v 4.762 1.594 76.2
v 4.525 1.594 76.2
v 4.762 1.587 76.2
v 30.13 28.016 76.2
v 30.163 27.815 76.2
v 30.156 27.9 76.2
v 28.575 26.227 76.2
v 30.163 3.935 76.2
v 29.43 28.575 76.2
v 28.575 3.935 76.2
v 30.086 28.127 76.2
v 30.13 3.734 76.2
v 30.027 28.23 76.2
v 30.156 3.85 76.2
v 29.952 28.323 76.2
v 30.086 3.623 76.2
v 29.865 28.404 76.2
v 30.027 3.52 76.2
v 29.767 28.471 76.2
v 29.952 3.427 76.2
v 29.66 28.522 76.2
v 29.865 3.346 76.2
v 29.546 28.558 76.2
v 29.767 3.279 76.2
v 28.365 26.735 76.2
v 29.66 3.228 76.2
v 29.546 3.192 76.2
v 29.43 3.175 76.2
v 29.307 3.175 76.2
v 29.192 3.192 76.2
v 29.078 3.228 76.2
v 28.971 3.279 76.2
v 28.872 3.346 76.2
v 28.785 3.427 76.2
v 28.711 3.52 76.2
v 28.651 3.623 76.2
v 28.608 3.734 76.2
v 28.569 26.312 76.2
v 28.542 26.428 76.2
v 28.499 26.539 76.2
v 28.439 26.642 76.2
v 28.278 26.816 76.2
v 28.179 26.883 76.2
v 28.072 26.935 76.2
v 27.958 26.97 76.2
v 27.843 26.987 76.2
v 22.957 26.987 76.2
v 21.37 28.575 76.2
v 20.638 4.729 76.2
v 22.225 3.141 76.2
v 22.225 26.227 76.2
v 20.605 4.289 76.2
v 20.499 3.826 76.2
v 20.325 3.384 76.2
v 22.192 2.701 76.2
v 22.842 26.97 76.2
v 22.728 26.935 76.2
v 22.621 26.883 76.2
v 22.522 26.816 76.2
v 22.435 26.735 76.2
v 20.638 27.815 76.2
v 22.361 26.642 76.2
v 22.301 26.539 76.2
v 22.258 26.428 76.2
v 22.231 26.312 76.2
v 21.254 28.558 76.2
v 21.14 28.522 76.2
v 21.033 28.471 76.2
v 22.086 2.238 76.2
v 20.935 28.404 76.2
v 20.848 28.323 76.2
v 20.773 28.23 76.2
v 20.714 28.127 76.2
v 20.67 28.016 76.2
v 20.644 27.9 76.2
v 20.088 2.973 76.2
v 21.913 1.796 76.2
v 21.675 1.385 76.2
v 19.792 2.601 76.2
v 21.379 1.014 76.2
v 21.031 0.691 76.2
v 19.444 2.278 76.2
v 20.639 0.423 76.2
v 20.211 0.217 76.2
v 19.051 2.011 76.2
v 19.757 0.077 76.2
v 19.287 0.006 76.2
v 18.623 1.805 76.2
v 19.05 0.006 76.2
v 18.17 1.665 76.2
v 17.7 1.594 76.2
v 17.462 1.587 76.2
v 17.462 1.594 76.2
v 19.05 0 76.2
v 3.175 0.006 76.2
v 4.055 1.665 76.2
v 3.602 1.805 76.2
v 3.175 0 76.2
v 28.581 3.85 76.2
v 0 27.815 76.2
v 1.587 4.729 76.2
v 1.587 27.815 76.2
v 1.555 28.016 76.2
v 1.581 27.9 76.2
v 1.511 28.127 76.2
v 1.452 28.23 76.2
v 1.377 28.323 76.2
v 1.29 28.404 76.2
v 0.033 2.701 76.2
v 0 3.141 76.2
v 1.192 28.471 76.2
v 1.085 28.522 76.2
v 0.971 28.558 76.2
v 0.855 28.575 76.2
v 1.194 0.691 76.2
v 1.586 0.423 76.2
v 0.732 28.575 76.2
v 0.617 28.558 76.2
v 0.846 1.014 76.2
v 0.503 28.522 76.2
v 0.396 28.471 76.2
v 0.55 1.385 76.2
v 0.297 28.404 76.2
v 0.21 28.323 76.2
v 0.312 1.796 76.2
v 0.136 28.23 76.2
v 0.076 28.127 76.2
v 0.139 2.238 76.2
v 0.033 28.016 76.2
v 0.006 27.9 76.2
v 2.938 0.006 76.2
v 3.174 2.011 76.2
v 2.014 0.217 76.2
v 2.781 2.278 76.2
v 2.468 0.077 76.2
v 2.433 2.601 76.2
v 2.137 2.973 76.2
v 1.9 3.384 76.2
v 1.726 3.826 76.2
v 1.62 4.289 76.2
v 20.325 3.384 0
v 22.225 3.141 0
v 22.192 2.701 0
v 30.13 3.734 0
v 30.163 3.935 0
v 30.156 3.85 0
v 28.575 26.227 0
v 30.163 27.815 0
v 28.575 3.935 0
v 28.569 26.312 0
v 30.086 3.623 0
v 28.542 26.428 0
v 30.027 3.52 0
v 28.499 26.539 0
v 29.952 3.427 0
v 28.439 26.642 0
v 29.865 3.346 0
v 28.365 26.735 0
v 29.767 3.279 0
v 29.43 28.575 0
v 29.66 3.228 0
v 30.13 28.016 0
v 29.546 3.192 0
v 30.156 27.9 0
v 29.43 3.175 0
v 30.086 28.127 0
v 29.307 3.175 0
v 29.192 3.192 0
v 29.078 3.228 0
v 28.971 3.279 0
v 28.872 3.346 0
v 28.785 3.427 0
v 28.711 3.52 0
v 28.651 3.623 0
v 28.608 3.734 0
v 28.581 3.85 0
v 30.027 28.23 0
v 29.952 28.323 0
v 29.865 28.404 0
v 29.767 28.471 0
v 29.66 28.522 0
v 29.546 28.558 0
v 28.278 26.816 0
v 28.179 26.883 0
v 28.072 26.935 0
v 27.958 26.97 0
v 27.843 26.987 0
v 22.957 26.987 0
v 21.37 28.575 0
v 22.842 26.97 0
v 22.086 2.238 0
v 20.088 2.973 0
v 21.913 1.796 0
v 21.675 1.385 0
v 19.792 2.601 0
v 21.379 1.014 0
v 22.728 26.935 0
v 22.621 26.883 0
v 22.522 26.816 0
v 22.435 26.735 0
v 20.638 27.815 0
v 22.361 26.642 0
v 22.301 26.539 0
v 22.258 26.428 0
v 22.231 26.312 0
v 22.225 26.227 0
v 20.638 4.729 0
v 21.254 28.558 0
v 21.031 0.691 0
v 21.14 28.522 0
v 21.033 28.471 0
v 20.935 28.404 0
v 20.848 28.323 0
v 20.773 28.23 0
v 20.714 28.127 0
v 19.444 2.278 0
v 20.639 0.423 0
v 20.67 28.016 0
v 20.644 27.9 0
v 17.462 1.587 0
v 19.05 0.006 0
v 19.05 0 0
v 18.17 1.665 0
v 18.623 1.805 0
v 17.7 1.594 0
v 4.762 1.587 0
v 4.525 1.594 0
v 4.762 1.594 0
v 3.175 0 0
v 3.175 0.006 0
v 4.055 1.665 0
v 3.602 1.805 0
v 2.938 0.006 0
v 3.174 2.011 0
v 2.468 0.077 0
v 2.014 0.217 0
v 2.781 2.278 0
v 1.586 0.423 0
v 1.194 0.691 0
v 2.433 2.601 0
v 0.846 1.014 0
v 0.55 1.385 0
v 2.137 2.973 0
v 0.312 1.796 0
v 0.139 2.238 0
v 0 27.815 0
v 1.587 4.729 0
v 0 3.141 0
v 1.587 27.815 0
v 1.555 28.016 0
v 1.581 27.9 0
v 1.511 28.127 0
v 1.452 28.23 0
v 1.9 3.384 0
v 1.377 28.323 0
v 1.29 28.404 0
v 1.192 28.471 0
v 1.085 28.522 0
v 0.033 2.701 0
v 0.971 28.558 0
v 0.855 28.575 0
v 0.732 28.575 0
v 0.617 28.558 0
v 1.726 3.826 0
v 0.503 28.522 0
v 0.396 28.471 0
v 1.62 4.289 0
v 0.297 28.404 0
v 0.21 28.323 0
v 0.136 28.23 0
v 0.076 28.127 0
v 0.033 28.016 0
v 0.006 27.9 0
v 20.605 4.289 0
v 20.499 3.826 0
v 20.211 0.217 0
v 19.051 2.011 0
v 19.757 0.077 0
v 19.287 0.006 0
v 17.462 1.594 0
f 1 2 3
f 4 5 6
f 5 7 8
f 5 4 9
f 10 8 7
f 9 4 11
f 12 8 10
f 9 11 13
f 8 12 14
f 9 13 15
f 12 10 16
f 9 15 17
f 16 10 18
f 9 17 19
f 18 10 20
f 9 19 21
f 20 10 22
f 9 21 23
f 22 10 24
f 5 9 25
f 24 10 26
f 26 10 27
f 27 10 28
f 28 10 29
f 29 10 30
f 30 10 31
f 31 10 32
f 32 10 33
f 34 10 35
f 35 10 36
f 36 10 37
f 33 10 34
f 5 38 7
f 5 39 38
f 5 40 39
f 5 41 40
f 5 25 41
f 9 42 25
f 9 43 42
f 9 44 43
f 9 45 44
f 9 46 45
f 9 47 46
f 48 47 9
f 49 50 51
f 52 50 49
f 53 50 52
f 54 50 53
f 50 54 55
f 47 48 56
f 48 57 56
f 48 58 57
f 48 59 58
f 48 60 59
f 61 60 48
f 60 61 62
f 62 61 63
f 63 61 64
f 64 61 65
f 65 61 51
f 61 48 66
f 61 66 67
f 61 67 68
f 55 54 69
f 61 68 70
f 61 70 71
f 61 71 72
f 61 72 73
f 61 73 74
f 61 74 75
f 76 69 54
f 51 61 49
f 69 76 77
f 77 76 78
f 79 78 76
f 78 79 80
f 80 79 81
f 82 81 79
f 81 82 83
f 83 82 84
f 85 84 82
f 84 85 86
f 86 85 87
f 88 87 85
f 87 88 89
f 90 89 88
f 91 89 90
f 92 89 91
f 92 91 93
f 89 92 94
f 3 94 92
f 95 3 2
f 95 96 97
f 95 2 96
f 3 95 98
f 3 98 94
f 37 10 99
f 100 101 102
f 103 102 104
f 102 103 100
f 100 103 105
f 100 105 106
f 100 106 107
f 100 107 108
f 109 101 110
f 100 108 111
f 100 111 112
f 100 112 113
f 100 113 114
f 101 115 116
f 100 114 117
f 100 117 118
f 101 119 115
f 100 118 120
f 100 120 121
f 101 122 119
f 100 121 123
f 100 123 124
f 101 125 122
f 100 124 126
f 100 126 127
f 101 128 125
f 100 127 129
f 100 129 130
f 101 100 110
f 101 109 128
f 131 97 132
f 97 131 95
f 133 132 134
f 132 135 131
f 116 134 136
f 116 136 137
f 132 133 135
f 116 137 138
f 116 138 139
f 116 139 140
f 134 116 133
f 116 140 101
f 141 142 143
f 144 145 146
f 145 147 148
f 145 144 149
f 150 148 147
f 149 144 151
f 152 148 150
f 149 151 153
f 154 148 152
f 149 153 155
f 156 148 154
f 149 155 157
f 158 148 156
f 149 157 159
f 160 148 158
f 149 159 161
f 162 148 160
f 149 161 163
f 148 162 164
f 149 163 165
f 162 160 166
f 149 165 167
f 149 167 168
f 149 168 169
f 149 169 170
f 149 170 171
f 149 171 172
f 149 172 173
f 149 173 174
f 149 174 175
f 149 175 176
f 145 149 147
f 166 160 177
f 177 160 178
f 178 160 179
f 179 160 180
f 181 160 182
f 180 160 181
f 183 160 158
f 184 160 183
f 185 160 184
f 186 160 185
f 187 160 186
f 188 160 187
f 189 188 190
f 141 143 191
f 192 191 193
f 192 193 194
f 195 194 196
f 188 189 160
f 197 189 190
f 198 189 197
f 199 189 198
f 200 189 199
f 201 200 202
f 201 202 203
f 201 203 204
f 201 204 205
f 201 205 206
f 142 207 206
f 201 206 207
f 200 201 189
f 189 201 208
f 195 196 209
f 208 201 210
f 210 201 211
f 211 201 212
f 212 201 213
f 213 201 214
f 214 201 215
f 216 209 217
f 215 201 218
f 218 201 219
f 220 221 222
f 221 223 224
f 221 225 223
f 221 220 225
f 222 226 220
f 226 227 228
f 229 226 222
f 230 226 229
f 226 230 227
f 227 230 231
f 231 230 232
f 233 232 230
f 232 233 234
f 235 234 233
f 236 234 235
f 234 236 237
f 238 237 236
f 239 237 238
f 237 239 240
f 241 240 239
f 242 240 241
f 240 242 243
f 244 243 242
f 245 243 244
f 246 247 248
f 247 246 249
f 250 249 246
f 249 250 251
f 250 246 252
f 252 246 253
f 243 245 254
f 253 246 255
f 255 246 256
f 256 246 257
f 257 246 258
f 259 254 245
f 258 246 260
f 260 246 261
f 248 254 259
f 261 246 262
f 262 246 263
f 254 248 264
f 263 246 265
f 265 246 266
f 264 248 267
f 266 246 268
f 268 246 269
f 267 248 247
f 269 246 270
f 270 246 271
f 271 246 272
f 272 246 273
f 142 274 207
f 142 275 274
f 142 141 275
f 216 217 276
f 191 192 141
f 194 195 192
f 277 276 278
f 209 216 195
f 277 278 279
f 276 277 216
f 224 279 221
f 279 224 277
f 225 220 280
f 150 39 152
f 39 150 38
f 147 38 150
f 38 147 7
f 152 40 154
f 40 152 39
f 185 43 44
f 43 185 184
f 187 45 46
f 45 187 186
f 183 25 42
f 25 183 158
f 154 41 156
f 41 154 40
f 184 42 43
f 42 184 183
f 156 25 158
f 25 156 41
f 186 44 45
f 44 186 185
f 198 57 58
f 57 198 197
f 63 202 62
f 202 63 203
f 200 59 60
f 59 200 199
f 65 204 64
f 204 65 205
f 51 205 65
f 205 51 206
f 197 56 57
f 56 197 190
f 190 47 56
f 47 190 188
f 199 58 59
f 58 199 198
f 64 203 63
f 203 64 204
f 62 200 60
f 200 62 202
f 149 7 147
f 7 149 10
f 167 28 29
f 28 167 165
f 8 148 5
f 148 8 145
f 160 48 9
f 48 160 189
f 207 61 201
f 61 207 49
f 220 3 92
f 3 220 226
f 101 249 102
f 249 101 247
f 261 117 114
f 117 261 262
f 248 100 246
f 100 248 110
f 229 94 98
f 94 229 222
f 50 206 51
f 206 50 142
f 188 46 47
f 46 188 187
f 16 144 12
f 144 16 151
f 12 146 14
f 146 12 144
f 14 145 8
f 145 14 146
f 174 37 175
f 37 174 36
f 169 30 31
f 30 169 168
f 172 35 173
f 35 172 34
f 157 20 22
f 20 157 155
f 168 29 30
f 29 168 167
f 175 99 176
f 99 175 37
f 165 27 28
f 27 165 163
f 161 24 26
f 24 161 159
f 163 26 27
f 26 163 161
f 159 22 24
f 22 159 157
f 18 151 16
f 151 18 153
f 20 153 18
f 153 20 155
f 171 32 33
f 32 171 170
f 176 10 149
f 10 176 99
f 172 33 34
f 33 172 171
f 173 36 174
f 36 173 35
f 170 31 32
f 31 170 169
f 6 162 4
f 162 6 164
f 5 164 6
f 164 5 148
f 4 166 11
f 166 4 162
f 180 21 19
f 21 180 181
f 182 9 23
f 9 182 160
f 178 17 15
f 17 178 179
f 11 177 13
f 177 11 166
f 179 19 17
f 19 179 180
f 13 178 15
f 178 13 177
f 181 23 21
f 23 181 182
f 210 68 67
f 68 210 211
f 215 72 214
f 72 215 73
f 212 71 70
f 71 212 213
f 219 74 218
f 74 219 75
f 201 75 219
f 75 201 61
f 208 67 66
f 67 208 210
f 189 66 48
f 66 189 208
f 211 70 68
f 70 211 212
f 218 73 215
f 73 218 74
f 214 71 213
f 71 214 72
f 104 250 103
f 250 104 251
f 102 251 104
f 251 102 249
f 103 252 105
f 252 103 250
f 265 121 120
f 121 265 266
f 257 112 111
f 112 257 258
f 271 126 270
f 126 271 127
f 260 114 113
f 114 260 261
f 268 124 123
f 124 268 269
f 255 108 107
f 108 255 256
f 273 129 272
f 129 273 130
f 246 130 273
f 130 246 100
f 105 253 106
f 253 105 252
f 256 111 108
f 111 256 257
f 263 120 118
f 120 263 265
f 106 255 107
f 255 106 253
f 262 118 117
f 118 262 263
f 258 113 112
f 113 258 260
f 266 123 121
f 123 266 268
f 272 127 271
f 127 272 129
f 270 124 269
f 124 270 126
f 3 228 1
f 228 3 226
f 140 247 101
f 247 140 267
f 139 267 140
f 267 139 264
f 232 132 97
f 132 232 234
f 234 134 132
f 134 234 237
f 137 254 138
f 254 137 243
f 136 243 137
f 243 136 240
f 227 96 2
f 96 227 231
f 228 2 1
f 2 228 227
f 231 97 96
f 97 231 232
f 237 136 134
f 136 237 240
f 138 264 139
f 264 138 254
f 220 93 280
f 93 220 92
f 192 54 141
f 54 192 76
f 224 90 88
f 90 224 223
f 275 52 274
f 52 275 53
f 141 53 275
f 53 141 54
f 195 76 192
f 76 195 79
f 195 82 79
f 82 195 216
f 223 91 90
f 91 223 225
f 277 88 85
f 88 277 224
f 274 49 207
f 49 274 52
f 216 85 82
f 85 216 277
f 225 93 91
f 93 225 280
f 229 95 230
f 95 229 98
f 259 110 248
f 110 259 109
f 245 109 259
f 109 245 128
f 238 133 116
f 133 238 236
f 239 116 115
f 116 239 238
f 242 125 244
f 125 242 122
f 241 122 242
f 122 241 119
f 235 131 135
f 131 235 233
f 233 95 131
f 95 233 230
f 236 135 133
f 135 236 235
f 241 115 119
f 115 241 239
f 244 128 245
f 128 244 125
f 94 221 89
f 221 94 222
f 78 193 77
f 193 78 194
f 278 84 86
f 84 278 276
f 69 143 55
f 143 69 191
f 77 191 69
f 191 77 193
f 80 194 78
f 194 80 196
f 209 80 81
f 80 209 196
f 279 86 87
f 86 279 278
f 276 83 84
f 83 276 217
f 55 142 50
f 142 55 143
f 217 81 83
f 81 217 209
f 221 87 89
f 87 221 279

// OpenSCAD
//BEGIN CUSTOMIZER VARIABLES
//All starting units are in in, since I'm an american and my
//dial caliper measures in inches.
/*[Bed Rail]*/

railWidth = 0.75;

slotHeight = 1;

innerFillet = 0.125;

outerFillet = 0.125;

/*[Desired Slot]*/

ledgeWidth = 0.25;
ledgeHeight = 0.875;
slotLength = 3;
/*[Advanced Stuffs]*/

//Basically are you using american units or real units
units_entered = 25.4;//[1:mm, 10:cm, 1000:meter, 25.4:inch, 304.8:foot]
//default is mm for most printers
desired_units_for_output = 1;//[1:mm, 0.1:cm, 0.001:meter, 0.0393701:inch, 0.00328084:foot]

//higher = smoother, but takes longer to render
resoultion = 42;

//thicker = more durable but longer to make.
clipThickness = 0.0625;

includeDefaultFillets = true;
//END CUSTOMIZER VARIABLES
//turns inches to metric
scale(units_entered/desired_units_for_output){
    difference(){
        union(){
            TraceOutline();
            roundCorners(center = [innerFillet+clipThickness,innerFillet+clipThickness], topRight = true, radi = innerFillet+0.0001);
            roundCorners(center = [railWidth+clipThickness-innerFillet,clipThickness+innerFillet], topLeft = true, radi = innerFillet+0.0001);
        }
        scale([1,1,1.0001]){
            translate([0,0,-0.00001]){
                roundCorners(center = [outerFillet,outerFillet], topRight = true, radi = outerFillet+0.0001);
                roundCorners(center = [railWidth+2*clipThickness-outerFillet,outerFillet], topLeft = true, radi = outerFillet+0.0001);
            }
        }
    }
}

module TraceOutline(){
    difference(){
        union(){
            linear_extrude(slotLength){
                square(size = [railWidth+2*clipThickness,clipThickness]);
                square(size = [clipThickness,slotHeight+2*clipThickness]);
                translate([railWidth+clipThickness, 0]){
                    square(size = [clipThickness,slotHeight+2*clipThickness]);
                }
                translate([railWidth+clipThickness, slotHeight+clipThickness]){
                    square(size = [ledgeWidth+2*clipThickness,clipThickness]);
                }
                translate([railWidth+ledgeWidth+clipThickness*2, slotHeight-ledgeHeight]){
                    square(size = [clipThickness,ledgeHeight+2*clipThickness]);
                }
            }
            if(includeDefaultFillets){
                addDefaultFillets();
            }
        }
        if(includeDefaultFillets){
            scale([1,1,1.0001]){
                translate([0,0,-0.00001]){
                    cutDefaultFillets();
                }
            }
        }
    }
}

module addDefaultFillets(){
    //4
    roundCorners(center = [1.5*clipThickness + railWidth + ledgeWidth, slotHeight + 0.5*clipThickness], bottomLeft = true, radi = clipThickness/2+0.0001);
    //5
    roundCorners(center = [2.5*clipThickness + railWidth, slotHeight + 0.5*clipThickness], bottomRight = true, radi = clipThickness/2+0.0001);
}

module cutDefaultFillets(){
    //1
    roundCorners(center = [2.5*clipThickness + railWidth + ledgeWidth, slotHeight - ledgeHeight + 0.5*clipThickness], topLeft = true, topRight = true, radi = clipThickness/2+0.0001);
    //2
    roundCorners(center = [2.5*clipThickness + railWidth + ledgeWidth, slotHeight + 1.5*clipThickness], bottomLeft = true, radi = clipThickness/2+0.0001);
    //3
    roundCorners(center = [1.5*clipThickness + railWidth, slotHeight + 1.5*clipThickness], bottomRight = true, radi = clipThickness/2+0.0001);
    //6
    roundCorners(center = [0.5*clipThickness, slotHeight + 1.5*clipThickness], bottomLeft = true, bottomRight = true, radi = clipThickness/2+0.0001);  
}

module roundCorners(center = [0,0], topLeft = false, topRight = false, bottomLeft = false, bottomRight = false, radi = 0.125){
    translate([center[0],center[1],0]){
        difference(){
            union(){
                if(topLeft){
                    rotate([0,0,270]){
                        cube([radi,radi,slotLength]);
                    }
                }
                if(topRight){
                    rotate([0,0,180]){
                        cube([radi,radi,slotLength]);
                    }
                }
                if(bottomLeft){
                    rotate([0,0,0]){
                        cube([radi,radi,slotLength]);
                    }
                }
                if(bottomRight){
                    rotate([0,0,90]){
                        cube([radi,radi,slotLength]);
                    }
                }
            }
            translate([0,0,-0.0001]){
                cylinder(r=radi, h = slotLength+0.001, $fn=resoultion);
            }
        }
    }
}
